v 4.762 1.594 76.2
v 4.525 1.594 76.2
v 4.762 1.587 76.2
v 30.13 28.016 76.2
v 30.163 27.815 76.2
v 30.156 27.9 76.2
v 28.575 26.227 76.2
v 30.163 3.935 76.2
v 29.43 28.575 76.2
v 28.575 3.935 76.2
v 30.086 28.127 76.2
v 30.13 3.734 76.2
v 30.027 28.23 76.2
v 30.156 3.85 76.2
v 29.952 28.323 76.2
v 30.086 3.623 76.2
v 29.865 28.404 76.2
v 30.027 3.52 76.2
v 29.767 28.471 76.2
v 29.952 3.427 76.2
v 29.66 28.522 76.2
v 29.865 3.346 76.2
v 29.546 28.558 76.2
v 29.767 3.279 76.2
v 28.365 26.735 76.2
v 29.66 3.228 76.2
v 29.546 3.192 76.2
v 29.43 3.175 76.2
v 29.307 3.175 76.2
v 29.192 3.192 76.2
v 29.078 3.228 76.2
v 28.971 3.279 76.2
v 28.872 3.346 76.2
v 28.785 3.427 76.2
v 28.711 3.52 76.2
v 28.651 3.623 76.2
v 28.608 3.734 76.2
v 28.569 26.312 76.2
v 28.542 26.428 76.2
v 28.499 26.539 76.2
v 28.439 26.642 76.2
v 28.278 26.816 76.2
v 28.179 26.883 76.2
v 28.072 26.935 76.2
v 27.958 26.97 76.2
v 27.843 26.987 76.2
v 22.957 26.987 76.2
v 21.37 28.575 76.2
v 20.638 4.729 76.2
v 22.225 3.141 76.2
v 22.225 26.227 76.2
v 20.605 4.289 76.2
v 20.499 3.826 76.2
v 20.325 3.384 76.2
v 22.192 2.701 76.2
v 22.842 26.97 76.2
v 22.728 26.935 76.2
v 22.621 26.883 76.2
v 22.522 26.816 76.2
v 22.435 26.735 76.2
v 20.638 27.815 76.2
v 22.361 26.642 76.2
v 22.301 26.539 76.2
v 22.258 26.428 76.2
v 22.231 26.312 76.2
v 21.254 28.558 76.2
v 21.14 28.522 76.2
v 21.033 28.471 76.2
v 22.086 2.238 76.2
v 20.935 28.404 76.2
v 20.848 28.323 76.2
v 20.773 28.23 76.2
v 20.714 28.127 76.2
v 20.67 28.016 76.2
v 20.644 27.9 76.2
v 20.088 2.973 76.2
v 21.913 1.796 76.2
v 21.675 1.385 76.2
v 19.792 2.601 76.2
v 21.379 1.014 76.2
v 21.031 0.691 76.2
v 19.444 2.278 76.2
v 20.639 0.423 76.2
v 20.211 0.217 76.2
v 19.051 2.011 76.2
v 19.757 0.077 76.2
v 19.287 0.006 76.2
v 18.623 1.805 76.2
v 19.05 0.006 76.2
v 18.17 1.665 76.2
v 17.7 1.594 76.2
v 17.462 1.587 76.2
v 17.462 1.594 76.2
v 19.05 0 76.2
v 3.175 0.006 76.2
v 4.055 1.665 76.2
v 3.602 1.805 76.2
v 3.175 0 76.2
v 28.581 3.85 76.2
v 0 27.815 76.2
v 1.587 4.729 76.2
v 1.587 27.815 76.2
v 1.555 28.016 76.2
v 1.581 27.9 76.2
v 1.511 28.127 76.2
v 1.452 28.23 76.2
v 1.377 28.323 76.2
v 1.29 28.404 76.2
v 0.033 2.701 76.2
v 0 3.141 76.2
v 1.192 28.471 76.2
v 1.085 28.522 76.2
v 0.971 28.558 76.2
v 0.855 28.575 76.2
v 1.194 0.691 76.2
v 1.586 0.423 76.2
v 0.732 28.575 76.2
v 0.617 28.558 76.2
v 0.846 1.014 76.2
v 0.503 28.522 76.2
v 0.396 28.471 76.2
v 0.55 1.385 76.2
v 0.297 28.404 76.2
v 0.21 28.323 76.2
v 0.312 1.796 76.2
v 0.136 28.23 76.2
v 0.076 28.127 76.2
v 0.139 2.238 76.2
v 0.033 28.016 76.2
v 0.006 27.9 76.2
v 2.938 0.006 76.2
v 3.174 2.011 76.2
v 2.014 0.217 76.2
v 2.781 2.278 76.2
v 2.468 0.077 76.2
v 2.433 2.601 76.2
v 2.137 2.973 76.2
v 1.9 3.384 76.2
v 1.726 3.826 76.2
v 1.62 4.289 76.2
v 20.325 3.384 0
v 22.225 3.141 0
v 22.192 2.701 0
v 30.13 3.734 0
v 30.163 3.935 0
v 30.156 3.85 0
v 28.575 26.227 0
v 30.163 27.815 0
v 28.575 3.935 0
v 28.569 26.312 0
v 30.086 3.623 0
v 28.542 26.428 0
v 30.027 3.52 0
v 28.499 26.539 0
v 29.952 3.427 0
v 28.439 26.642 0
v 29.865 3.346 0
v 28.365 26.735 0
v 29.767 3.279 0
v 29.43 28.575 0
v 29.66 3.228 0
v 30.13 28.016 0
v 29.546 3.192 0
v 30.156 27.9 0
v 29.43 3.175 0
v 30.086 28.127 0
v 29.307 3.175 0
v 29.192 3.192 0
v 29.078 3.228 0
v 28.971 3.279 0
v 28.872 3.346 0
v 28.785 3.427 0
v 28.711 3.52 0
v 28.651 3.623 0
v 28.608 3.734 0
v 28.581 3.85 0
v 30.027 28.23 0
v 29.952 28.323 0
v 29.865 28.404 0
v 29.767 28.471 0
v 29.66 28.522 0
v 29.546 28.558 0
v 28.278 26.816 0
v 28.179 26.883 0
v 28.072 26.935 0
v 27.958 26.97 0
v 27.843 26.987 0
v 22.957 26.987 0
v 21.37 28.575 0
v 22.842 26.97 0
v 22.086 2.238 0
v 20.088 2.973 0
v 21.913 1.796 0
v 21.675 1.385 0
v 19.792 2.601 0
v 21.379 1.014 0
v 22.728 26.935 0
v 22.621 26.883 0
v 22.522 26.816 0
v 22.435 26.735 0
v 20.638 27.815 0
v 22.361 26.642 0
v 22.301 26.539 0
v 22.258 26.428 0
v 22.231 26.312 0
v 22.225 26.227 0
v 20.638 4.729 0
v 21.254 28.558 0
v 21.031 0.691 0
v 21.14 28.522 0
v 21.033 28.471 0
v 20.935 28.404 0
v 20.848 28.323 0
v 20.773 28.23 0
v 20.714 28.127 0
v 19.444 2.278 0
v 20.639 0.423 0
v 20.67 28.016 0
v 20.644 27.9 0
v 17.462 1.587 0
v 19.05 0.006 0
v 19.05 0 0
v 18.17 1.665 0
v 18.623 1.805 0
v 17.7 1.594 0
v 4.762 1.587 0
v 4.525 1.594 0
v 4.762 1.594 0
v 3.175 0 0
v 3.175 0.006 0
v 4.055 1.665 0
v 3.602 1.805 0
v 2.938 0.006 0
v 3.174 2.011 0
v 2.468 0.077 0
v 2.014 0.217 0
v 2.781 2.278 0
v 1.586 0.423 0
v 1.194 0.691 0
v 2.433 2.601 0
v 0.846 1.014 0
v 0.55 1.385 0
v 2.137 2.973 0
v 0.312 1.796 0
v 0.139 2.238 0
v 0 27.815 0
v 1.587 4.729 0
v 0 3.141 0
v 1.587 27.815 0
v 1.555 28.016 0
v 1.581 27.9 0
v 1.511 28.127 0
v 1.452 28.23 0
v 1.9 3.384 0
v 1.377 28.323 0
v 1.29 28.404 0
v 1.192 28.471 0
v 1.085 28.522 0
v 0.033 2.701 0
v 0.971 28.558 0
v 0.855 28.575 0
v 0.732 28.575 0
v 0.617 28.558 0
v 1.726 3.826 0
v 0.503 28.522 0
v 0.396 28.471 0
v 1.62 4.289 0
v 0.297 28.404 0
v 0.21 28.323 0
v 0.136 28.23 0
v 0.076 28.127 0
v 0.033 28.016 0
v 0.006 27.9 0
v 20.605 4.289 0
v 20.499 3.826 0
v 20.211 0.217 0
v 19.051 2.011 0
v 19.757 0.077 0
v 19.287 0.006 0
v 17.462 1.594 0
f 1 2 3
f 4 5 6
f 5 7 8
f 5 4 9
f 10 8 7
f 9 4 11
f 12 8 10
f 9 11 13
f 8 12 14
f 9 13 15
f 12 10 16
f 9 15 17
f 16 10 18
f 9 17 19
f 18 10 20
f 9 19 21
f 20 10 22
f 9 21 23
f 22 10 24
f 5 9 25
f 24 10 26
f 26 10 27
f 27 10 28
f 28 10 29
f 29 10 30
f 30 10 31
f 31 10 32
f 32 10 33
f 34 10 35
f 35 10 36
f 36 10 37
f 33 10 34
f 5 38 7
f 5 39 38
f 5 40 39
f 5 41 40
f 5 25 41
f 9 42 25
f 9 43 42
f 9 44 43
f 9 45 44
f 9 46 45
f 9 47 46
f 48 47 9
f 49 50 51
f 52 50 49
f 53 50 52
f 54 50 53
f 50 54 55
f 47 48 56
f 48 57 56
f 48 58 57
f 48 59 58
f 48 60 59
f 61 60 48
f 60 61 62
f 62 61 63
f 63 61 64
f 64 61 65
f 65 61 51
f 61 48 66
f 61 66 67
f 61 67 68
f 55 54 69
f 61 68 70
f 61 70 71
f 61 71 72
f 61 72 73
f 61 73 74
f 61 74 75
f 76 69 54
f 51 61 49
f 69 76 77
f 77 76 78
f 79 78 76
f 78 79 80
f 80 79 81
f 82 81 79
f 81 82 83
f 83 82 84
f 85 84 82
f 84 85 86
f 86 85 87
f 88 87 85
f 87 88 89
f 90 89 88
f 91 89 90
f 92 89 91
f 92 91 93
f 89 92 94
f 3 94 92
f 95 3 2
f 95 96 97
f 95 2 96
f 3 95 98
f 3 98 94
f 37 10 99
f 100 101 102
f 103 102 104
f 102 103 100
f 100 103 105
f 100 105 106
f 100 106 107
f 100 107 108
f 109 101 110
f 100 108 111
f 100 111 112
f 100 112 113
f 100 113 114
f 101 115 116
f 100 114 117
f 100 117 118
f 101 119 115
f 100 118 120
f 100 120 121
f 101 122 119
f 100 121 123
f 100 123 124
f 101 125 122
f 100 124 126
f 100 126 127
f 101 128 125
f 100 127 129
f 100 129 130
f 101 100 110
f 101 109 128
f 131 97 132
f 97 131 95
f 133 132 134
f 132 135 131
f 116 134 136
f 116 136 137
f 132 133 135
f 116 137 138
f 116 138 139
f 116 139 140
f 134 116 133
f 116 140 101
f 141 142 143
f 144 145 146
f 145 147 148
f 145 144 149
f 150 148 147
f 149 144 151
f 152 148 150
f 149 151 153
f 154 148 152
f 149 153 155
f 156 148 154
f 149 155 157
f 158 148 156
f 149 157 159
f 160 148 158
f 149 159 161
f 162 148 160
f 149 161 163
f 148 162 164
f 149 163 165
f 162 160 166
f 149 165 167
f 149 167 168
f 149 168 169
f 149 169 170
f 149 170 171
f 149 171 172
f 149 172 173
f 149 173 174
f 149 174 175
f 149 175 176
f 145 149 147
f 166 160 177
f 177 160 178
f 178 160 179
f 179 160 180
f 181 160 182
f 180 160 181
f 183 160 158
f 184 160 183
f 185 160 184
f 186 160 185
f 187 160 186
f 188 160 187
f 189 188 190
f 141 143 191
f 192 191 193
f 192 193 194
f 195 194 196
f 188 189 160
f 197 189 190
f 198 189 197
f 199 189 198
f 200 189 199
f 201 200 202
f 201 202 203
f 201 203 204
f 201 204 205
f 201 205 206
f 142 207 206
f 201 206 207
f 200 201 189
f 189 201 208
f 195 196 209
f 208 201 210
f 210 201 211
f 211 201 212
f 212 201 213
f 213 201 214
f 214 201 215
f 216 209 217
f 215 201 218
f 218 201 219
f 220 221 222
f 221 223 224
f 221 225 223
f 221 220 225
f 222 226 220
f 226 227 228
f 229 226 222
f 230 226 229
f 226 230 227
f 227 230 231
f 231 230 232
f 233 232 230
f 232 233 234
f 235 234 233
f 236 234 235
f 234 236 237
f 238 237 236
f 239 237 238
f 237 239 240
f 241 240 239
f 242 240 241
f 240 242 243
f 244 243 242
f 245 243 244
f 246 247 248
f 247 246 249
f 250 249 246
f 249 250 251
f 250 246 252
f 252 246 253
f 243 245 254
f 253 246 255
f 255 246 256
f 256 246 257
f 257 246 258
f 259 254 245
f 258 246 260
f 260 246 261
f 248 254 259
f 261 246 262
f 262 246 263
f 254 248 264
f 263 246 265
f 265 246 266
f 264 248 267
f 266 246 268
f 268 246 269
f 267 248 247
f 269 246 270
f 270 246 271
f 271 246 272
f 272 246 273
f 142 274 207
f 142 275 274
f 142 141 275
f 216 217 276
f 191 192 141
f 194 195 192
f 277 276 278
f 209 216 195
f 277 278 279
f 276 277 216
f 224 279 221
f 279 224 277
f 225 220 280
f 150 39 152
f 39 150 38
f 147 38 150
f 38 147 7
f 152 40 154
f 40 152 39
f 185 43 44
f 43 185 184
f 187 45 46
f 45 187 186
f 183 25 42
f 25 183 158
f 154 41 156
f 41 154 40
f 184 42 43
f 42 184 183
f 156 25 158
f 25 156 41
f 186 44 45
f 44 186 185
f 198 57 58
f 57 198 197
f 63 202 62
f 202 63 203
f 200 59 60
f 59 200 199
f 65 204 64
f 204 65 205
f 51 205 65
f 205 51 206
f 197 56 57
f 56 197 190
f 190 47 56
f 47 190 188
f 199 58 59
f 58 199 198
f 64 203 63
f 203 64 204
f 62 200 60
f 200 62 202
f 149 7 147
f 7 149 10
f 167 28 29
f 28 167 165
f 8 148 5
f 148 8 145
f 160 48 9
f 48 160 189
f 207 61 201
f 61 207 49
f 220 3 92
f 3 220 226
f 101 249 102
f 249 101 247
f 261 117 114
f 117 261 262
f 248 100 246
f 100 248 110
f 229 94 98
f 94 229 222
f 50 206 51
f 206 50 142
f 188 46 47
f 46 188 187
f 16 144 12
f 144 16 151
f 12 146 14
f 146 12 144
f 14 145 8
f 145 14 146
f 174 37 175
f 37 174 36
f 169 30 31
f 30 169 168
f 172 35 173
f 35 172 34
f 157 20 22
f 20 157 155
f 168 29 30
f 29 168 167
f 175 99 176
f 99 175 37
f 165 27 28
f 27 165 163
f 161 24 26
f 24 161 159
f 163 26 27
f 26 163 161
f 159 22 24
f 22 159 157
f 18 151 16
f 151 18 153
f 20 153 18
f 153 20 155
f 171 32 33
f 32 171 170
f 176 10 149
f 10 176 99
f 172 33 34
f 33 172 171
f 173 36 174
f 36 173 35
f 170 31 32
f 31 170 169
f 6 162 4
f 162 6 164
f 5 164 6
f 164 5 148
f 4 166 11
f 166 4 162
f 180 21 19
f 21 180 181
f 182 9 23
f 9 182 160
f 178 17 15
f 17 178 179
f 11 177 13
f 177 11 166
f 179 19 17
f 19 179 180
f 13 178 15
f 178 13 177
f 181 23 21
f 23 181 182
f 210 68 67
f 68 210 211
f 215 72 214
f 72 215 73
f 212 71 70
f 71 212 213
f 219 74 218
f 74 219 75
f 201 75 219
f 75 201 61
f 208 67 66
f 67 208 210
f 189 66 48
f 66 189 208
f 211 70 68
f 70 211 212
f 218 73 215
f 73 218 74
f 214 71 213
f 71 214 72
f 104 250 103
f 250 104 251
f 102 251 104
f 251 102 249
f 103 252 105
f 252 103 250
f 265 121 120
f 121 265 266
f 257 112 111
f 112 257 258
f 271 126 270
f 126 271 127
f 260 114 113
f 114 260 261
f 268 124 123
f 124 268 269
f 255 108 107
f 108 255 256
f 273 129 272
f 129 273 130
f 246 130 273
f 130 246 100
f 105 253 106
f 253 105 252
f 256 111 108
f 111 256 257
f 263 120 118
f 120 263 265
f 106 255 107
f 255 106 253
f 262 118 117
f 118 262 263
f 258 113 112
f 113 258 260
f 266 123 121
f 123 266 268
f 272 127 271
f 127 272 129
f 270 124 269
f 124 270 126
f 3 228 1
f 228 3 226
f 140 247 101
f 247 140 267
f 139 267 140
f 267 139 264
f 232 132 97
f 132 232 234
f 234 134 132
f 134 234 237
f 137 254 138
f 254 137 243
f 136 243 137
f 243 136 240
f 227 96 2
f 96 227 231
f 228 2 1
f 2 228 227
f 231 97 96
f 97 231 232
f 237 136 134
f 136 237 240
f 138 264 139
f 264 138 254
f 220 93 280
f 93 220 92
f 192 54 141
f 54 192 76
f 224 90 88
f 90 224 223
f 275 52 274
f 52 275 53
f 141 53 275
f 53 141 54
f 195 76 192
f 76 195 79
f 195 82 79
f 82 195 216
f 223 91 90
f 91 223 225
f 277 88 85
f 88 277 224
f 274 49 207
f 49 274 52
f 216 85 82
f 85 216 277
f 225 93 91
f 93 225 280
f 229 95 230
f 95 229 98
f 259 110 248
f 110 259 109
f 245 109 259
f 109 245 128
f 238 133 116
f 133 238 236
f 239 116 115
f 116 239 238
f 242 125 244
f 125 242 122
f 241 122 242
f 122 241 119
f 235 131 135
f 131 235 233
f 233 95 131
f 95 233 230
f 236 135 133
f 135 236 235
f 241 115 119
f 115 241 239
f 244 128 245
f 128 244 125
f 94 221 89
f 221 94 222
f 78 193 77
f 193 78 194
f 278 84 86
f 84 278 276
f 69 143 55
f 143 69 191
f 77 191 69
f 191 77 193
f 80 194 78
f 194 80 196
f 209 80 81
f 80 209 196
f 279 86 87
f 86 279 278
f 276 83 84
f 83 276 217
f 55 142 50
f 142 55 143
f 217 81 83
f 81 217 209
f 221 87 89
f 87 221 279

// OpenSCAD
//BEGIN CUSTOMIZER VARIABLES
//All starting units are in in, since I'm an american and my
//dial caliper measures in inches.
/*[Bed Rail]*/

railWidth = 0.75;

slotHeight = 1;

innerFillet = 0.125;

outerFillet = 0.125;

/*[Desired Slot]*/

ledgeWidth = 0.25;
ledgeHeight = 0.875;
slotLength = 3;
/*[Advanced Stuffs]*/

//Basically are you using american units or real units
units_entered = 25.4;//[1:mm, 10:cm, 1000:meter, 25.4:inch, 304.8:foot]
//default is mm for most printers
desired_units_for_output = 1;//[1:mm, 0.1:cm, 0.001:meter, 0.0393701:inch, 0.00328084:foot]

//higher = smoother, but takes longer to render
resoultion = 42;

//thicker = more durable but longer to make.
clipThickness = 0.0625;

includeDefaultFillets = true;
//END CUSTOMIZER VARIABLES
//turns inches to metric
scale(units_entered/desired_units_for_output){
    difference(){
        union(){
            TraceOutline();
            roundCorners(center = [innerFillet+clipThickness,innerFillet+clipThickness], topRight = true, radi = innerFillet+0.0001);
            roundCorners(center = [railWidth+clipThickness-innerFillet,clipThickness+innerFillet], topLeft = true, radi = innerFillet+0.0001);
        }
        scale([1,1,1.0001]){
            translate([0,0,-0.00001]){
                roundCorners(center = [outerFillet,outerFillet], topRight = true, radi = outerFillet+0.0001);
                roundCorners(center = [railWidth+2*clipThickness-outerFillet,outerFillet], topLeft = true, radi = outerFillet+0.0001);
            }
        }
    }
}

module TraceOutline(){
    difference(){
        union(){
            linear_extrude(slotLength){
                square(size = [railWidth+2*clipThickness,clipThickness]);
                square(size = [clipThickness,slotHeight+2*clipThickness]);
                translate([railWidth+clipThickness, 0]){
                    square(size = [clipThickness,slotHeight+2*clipThickness]);
                }
                translate([railWidth+clipThickness, slotHeight+clipThickness]){
                    square(size = [ledgeWidth+2*clipThickness,clipThickness]);
                }
                translate([railWidth+ledgeWidth+clipThickness*2, slotHeight-ledgeHeight]){
                    square(size = [clipThickness,ledgeHeight+2*clipThickness]);
                }
            }
            if(includeDefaultFillets){
                addDefaultFillets();
            }
        }
        if(includeDefaultFillets){
            scale([1,1,1.0001]){
                translate([0,0,-0.00001]){
                    cutDefaultFillets();
                }
            }
        }
    }
}

module addDefaultFillets(){
    //4
    roundCorners(center = [1.5*clipThickness + railWidth + ledgeWidth, slotHeight + 0.5*clipThickness], bottomLeft = true, radi = clipThickness/2+0.0001);
    //5
    roundCorners(center = [2.5*clipThickness + railWidth, slotHeight + 0.5*clipThickness], bottomRight = true, radi = clipThickness/2+0.0001);
}

module cutDefaultFillets(){
    //1
    roundCorners(center = [2.5*clipThickness + railWidth + ledgeWidth, slotHeight - ledgeHeight + 0.5*clipThickness], topLeft = true, topRight = true, radi = clipThickness/2+0.0001);
    //2
    roundCorners(center = [2.5*clipThickness + railWidth + ledgeWidth, slotHeight + 1.5*clipThickness], bottomLeft = true, radi = clipThickness/2+0.0001);
    //3
    roundCorners(center = [1.5*clipThickness + railWidth, slotHeight + 1.5*clipThickness], bottomRight = true, radi = clipThickness/2+0.0001);
    //6
    roundCorners(center = [0.5*clipThickness, slotHeight + 1.5*clipThickness], bottomLeft = true, bottomRight = true, radi = clipThickness/2+0.0001);  
}

module roundCorners(center = [0,0], topLeft = false, topRight = false, bottomLeft = false, bottomRight = false, radi = 0.125){
    translate([center[0],center[1],0]){
        difference(){
            union(){
                if(topLeft){
                    rotate([0,0,270]){
                        cube([radi,radi,slotLength]);
                    }
                }
                if(topRight){
                    rotate([0,0,180]){
                        cube([radi,radi,slotLength]);
                    }
                }
                if(bottomLeft){
                    rotate([0,0,0]){
                        cube([radi,radi,slotLength]);
                    }
                }
                if(bottomRight){
                    rotate([0,0,90]){
                        cube([radi,radi,slotLength]);
                    }
                }
            }
            translate([0,0,-0.0001]){
                cylinder(r=radi, h = slotLength+0.001, $fn=resoultion);
            }
        }
    }
}
